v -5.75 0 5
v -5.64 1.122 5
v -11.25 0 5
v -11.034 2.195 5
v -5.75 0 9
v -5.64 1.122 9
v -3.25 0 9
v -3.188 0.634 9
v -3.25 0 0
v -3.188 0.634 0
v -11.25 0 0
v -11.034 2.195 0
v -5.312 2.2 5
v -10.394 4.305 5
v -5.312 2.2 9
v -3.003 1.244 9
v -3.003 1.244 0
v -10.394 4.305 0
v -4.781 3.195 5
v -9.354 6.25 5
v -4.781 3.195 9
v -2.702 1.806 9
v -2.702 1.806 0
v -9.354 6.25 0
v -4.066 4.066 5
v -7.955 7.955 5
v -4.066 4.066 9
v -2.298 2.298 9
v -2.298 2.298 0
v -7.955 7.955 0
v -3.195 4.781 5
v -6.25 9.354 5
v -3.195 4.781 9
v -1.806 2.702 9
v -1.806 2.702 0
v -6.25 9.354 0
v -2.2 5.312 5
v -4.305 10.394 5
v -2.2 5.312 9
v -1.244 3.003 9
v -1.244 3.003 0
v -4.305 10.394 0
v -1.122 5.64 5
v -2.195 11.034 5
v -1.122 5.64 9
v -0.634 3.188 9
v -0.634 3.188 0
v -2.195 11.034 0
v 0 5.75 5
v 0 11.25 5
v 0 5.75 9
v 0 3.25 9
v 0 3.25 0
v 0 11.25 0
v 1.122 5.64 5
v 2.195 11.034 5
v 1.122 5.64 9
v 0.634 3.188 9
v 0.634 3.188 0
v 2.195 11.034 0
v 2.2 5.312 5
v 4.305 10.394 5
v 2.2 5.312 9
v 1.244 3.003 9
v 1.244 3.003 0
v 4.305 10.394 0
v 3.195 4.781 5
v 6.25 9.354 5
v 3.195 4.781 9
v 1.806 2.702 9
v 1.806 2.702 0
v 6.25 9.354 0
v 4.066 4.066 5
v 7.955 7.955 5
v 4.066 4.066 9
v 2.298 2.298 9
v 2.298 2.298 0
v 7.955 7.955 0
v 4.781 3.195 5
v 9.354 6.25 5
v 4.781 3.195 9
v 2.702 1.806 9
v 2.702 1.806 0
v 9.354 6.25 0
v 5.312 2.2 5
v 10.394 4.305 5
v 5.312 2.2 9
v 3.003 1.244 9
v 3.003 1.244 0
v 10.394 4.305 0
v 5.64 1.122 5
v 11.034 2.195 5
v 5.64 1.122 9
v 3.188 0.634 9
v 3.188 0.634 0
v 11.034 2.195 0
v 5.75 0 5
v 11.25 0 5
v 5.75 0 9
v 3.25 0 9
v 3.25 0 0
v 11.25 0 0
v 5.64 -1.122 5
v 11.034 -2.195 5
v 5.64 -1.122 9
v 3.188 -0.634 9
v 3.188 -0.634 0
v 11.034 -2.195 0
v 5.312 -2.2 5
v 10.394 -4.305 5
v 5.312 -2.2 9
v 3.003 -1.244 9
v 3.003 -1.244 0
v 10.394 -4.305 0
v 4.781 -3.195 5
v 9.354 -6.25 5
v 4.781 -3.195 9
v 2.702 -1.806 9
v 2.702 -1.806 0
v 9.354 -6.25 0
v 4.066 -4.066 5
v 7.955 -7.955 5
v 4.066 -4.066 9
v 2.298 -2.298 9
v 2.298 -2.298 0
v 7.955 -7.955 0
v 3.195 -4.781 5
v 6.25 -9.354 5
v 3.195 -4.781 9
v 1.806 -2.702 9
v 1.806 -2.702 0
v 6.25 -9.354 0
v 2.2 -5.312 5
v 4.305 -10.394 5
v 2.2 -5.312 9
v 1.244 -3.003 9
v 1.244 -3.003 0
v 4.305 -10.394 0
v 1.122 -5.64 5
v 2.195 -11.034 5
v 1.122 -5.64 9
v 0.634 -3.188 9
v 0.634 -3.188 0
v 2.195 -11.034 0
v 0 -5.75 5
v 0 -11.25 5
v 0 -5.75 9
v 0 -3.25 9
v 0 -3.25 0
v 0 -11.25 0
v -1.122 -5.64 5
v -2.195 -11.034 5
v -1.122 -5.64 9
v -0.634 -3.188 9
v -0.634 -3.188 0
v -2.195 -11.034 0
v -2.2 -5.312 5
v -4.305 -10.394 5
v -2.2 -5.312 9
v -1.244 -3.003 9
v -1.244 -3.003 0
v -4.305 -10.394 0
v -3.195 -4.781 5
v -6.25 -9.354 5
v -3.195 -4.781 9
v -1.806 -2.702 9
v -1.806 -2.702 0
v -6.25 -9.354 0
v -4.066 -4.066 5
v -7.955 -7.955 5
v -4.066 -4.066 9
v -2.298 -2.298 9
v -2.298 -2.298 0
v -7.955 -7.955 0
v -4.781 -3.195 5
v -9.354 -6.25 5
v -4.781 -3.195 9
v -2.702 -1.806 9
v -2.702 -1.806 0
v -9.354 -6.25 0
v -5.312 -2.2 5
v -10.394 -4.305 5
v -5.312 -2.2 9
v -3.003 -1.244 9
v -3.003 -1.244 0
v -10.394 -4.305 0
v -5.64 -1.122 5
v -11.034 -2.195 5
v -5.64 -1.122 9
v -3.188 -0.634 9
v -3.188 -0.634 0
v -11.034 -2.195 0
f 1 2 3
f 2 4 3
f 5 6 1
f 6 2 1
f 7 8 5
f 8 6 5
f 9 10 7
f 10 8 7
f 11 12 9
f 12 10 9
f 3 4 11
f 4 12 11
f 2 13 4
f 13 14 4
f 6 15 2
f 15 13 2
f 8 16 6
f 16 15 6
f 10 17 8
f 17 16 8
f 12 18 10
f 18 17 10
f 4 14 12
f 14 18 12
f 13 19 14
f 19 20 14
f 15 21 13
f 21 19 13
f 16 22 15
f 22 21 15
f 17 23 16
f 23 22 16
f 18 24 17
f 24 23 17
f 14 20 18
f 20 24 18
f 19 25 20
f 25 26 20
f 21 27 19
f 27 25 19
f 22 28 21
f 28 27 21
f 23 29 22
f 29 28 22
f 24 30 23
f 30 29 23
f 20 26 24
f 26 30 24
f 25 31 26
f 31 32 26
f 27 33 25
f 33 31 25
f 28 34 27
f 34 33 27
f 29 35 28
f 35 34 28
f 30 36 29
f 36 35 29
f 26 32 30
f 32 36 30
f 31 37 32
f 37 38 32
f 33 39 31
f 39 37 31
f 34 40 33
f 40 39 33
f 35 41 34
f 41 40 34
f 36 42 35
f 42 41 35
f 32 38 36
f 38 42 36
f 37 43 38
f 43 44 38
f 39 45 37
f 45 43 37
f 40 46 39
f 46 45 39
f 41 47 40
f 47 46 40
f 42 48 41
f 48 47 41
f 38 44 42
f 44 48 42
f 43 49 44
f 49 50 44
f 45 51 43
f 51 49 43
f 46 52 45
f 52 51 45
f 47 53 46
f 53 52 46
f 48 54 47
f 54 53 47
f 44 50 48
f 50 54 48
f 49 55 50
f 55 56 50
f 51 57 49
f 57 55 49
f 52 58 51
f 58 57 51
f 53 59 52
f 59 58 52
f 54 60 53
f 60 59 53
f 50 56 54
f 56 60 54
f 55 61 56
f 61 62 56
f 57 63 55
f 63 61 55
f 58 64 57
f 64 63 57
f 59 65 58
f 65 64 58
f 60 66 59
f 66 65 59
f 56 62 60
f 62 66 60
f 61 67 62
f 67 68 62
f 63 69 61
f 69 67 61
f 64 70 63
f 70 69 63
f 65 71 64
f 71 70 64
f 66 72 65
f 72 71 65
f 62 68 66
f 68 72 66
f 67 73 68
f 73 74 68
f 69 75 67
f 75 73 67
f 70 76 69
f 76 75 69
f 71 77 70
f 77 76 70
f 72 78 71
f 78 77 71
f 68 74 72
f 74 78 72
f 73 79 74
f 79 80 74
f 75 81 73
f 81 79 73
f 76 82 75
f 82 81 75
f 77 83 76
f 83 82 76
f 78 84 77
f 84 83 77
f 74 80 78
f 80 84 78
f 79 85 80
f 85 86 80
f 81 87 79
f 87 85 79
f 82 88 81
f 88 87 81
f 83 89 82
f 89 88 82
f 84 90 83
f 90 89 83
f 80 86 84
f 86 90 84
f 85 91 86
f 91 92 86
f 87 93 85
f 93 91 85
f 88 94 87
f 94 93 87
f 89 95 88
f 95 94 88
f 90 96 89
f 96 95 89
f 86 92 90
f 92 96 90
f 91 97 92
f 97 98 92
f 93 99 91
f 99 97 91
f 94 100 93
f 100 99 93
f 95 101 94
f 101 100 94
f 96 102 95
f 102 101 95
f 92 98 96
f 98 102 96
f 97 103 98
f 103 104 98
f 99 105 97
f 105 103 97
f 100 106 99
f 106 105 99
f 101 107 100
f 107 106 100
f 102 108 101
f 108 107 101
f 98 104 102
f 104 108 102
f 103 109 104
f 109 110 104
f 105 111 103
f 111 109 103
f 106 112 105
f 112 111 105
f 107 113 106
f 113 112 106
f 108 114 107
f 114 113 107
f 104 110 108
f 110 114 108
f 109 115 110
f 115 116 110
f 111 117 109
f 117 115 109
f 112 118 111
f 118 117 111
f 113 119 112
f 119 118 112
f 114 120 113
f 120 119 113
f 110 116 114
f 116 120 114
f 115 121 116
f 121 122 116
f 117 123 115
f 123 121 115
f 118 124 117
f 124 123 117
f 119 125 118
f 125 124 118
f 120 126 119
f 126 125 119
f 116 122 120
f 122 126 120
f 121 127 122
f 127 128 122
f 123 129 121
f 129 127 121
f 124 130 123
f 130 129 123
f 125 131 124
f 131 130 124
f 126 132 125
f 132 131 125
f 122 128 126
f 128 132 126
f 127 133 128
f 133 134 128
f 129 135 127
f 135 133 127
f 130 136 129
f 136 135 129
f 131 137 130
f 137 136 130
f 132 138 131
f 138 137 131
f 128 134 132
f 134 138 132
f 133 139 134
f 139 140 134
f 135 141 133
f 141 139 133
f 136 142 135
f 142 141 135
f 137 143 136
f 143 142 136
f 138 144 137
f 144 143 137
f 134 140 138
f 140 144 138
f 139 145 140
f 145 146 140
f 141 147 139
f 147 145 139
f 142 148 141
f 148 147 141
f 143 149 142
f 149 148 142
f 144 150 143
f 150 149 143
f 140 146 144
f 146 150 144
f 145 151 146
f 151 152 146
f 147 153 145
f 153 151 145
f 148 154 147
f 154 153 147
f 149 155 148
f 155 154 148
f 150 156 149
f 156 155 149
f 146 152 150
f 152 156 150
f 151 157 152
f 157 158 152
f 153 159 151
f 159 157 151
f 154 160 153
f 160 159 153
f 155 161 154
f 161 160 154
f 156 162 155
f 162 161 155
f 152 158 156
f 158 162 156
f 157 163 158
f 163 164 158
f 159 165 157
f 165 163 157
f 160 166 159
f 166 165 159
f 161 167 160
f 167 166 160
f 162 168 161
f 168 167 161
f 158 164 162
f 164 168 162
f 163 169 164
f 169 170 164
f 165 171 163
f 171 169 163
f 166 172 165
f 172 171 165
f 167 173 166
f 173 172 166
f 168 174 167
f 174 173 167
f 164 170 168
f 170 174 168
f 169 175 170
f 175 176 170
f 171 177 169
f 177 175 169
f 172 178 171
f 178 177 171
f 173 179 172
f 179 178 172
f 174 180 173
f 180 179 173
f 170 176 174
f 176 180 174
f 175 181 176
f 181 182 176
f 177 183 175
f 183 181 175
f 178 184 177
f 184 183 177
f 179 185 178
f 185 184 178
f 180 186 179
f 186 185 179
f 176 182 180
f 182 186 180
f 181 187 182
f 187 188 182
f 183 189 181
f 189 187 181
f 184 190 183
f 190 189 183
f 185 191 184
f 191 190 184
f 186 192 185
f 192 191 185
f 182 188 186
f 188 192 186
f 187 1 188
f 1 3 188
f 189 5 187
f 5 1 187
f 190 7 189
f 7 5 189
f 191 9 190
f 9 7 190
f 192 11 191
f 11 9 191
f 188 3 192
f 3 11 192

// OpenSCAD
$fn = 32;

// ----------------------------------------------------------------------
// Form washer: stepped_c washer, 22.5 mm outside, 6.5 mm bore
// ----------------------------------------------------------------------

// --- parameters (mm) ---
revolve_angle = 360;      // full turn around the Z axis
profile_points = 6;       // points of the closed outline

profile = [[3.25, 0], [11.25, 0], [11.25, 5], [5.75, 5], [5.75, 9], [3.25, 9]];  // single closed polygon, 6 points, counter clockwise

// --- the one profile operation ---
rotate_extrude(angle = revolve_angle) polygon(points = profile);
